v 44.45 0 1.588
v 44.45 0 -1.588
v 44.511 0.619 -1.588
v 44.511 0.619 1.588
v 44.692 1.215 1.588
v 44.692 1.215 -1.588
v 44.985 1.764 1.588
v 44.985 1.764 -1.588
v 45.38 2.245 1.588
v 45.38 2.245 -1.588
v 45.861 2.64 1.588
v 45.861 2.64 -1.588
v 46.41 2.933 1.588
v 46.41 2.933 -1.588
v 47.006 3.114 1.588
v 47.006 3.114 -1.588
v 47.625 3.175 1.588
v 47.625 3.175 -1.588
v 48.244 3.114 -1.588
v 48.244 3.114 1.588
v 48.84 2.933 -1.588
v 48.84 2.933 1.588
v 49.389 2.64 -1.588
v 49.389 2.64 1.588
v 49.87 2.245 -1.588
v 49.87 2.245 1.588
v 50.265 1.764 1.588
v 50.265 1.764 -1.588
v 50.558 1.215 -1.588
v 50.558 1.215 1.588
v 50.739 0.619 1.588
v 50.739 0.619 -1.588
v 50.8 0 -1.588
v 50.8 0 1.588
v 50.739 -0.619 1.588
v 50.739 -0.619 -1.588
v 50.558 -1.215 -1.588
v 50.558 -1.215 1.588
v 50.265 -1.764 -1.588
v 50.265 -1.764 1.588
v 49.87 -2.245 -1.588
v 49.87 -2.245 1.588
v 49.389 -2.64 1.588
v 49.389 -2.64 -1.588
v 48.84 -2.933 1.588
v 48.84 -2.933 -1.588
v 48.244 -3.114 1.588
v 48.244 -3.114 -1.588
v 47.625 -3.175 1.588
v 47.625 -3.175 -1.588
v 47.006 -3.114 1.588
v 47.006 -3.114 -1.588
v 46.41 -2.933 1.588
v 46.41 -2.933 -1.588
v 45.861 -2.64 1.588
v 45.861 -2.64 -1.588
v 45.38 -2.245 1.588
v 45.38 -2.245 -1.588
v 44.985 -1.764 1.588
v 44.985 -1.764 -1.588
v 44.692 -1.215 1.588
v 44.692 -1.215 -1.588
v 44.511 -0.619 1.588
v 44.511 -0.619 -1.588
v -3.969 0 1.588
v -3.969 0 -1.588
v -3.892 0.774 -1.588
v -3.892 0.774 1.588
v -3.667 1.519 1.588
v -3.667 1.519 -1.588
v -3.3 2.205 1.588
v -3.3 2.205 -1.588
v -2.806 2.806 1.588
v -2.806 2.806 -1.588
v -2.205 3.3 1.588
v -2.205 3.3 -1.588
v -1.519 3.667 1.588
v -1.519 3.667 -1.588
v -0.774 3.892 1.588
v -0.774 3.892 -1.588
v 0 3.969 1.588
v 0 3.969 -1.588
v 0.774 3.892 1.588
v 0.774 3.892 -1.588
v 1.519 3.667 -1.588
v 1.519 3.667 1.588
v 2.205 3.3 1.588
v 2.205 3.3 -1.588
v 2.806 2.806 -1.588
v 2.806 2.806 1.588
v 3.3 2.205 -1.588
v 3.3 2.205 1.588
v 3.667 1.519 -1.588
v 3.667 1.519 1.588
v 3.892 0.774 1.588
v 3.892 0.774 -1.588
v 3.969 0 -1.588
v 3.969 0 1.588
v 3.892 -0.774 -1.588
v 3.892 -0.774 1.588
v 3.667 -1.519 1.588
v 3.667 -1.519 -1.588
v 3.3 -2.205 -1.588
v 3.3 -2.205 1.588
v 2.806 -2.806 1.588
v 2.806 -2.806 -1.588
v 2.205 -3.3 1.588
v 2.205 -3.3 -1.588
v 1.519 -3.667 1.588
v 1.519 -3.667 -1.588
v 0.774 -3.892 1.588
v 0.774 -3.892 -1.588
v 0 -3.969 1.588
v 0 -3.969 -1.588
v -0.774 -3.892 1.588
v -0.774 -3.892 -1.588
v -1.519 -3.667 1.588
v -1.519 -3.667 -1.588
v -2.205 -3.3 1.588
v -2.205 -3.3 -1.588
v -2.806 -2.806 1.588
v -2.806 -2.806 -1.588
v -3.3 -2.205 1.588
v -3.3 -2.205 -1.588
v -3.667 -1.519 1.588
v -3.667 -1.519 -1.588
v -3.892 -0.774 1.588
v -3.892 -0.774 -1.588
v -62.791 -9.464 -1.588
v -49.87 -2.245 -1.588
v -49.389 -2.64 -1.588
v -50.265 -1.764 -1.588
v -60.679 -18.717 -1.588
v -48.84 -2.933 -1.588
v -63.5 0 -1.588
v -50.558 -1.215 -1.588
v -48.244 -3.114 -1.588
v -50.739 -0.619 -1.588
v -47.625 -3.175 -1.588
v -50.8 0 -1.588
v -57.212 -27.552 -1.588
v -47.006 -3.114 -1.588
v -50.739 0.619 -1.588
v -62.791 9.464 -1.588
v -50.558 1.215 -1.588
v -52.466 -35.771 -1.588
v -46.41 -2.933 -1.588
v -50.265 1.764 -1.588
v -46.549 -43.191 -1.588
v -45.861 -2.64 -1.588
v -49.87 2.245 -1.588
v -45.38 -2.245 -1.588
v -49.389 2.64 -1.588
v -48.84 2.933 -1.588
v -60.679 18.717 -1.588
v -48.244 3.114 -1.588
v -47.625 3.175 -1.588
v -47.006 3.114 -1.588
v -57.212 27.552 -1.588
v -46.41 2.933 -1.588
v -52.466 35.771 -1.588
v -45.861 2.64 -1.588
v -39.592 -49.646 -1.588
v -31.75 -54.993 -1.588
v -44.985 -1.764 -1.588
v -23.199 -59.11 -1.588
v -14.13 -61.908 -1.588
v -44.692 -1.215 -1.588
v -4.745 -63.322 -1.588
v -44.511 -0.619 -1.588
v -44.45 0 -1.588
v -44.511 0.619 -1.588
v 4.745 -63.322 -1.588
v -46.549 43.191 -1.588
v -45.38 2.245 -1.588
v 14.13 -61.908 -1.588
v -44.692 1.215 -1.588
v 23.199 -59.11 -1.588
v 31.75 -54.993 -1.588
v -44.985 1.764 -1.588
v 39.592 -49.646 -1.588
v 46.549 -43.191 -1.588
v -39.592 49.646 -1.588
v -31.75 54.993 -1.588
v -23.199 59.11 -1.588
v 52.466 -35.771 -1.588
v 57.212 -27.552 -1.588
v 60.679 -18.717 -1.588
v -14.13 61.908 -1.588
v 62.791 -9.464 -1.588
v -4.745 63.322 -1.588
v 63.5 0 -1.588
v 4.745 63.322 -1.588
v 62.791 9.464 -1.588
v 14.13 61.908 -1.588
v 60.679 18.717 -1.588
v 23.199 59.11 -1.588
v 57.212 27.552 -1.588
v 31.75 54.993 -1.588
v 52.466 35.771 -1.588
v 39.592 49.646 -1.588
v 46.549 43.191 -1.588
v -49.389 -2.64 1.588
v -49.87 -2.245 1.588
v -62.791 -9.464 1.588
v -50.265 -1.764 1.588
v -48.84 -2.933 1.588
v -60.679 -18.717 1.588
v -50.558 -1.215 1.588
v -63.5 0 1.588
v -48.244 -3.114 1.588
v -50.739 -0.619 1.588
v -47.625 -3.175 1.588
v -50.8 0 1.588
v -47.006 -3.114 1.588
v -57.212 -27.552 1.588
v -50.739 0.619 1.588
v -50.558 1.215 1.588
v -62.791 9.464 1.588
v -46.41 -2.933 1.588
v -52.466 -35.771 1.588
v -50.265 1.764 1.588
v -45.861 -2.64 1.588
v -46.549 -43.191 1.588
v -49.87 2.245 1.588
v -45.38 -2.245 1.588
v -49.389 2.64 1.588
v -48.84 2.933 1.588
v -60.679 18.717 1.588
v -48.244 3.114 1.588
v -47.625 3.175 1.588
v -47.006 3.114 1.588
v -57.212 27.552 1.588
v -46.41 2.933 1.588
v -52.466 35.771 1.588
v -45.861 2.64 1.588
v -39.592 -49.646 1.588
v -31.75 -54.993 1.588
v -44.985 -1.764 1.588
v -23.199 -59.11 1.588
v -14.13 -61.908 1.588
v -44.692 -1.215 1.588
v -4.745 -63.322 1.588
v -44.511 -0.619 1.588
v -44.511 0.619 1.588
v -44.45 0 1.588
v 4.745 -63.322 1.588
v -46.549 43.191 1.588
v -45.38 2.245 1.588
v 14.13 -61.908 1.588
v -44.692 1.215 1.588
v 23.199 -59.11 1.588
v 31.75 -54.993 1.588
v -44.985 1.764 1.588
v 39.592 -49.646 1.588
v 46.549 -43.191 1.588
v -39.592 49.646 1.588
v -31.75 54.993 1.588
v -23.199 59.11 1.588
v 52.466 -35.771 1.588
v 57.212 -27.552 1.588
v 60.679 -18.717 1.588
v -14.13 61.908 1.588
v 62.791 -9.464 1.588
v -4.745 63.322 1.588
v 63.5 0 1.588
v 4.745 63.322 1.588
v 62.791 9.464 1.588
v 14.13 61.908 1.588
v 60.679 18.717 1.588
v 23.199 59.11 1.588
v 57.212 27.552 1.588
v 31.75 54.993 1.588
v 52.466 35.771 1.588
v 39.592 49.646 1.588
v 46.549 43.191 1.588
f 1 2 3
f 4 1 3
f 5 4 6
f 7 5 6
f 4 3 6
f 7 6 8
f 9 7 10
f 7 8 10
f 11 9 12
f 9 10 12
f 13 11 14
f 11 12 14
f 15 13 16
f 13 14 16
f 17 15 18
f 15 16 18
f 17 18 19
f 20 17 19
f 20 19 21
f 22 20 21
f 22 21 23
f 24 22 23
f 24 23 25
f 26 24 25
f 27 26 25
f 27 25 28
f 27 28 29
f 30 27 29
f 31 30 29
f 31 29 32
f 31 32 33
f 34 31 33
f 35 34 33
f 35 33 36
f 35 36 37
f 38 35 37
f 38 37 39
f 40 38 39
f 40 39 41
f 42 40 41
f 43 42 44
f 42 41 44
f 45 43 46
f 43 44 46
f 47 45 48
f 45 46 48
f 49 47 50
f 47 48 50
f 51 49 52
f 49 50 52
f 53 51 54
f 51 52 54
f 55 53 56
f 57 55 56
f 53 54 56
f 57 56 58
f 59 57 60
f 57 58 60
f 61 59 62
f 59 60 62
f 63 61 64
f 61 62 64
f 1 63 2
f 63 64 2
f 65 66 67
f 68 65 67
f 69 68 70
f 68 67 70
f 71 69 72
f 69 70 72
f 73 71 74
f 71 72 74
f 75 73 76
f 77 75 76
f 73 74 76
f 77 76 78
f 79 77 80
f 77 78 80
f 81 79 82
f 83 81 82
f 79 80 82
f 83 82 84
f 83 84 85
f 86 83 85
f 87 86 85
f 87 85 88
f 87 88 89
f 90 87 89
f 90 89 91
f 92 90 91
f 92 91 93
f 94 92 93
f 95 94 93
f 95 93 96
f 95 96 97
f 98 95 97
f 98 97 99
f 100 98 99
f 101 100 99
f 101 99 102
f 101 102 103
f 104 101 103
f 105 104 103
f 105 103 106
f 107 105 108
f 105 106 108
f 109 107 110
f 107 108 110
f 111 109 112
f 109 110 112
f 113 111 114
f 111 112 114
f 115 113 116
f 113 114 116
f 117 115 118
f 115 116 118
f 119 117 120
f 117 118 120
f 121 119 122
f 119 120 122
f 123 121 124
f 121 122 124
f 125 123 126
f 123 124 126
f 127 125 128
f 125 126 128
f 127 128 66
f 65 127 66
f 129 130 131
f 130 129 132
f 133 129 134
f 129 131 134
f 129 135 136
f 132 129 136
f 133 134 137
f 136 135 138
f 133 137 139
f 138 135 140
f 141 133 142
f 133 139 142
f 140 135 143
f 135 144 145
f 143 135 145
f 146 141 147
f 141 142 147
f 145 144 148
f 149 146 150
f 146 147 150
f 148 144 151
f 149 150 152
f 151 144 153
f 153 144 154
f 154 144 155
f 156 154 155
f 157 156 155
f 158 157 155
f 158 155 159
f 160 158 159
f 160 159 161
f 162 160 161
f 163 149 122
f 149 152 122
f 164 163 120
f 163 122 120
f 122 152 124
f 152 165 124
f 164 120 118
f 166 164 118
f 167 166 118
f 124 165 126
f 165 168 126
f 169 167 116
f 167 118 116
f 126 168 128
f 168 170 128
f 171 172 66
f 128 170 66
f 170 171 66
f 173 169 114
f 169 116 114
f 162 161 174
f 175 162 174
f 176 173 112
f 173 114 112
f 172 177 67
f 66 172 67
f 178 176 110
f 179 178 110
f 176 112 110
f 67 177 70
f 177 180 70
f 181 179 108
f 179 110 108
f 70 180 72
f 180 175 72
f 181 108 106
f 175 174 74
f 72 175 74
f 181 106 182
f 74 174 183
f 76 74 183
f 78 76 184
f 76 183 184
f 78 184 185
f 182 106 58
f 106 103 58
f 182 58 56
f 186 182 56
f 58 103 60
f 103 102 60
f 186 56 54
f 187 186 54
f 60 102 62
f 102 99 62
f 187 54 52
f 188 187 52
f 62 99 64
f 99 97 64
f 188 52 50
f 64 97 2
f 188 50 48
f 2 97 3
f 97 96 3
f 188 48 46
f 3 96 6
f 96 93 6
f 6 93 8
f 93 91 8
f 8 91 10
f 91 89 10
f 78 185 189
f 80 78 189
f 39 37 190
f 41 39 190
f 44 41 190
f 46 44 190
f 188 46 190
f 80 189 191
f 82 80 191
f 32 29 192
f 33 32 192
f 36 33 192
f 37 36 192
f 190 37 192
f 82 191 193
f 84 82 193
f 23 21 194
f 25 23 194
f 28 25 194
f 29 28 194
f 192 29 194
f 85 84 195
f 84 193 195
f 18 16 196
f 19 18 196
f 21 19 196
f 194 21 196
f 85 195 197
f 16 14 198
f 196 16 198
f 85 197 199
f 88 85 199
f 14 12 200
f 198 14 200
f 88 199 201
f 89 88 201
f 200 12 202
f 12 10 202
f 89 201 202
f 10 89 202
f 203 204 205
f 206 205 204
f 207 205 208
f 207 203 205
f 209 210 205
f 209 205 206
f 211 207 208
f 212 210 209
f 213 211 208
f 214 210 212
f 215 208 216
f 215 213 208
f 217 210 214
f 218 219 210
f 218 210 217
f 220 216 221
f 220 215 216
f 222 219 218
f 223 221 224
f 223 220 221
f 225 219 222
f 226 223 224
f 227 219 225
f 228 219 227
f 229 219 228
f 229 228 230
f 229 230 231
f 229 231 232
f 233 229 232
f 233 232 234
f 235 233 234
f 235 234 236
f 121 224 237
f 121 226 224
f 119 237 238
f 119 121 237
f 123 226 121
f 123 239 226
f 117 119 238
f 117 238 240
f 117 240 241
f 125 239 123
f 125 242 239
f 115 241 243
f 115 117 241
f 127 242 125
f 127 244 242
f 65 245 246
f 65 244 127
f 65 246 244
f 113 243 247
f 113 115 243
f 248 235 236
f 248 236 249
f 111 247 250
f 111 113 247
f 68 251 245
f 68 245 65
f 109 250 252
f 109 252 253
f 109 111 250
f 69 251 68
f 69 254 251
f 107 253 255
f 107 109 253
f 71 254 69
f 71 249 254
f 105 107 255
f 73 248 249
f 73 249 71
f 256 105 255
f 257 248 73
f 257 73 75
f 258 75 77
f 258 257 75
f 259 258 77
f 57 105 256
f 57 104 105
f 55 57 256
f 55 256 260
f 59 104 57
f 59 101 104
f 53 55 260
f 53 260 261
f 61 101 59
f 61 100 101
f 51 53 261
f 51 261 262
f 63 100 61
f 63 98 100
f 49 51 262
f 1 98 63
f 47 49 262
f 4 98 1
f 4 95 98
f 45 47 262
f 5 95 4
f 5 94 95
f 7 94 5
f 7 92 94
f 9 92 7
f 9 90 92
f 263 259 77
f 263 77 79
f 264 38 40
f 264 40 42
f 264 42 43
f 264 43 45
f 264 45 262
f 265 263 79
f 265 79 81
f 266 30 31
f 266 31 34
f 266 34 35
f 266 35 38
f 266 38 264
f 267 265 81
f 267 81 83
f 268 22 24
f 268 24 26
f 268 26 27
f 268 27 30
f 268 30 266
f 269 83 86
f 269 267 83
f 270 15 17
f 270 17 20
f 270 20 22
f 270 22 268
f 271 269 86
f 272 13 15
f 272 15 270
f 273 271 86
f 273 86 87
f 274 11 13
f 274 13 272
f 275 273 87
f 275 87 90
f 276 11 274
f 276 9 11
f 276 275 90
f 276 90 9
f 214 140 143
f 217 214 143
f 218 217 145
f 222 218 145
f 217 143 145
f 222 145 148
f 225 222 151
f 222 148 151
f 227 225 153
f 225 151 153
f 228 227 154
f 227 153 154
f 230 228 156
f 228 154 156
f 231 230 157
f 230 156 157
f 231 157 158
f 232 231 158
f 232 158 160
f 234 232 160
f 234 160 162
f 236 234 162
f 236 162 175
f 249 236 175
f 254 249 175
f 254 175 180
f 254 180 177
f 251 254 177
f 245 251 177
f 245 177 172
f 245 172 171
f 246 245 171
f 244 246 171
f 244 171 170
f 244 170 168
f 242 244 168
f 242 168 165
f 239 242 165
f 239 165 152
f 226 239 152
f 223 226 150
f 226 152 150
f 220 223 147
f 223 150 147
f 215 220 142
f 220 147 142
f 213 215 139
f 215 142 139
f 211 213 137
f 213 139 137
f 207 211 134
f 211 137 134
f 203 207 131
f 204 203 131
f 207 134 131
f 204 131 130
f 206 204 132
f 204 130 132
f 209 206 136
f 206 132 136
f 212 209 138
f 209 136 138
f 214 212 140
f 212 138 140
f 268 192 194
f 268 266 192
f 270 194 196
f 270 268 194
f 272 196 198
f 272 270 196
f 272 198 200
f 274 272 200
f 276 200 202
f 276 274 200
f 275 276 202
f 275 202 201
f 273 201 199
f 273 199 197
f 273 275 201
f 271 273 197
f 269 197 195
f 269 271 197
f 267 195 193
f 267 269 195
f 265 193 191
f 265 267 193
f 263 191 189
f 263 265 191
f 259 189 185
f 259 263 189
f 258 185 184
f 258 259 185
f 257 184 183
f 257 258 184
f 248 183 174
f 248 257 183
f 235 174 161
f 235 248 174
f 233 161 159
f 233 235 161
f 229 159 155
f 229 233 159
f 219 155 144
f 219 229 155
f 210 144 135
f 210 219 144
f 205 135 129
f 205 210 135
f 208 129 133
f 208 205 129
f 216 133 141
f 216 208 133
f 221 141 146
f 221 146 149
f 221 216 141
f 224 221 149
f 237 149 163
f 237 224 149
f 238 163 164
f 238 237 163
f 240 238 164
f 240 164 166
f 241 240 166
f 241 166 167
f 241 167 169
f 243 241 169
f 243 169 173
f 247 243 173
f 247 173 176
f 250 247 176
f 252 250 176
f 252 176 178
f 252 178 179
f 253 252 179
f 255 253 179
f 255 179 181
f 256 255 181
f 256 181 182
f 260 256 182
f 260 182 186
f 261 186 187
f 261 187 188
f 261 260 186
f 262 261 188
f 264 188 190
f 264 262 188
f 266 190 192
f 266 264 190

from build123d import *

# Parameters (mm, degrees)
SKETCH1_R                          = 63.5
BOSS_EXTRUDE1_DEPTH                = 1.5875
F_1_4_0_25_DIAMETER_HOLE1_D        = 6.35
F_5_16_0_3125_DIAMETER_HOLE1_D     = 7.9375
F_5_16_0_3125_DIAMETER_HOLE1_DEPTH = 3.302


with BuildPart() as part:
    # Sketch1 → Boss-Extrude1 (new body, symmetric)
    with BuildSketch(Plane.XY):
        Circle(SKETCH1_R)
    extrude(amount=BOSS_EXTRUDE1_DEPTH, both=True)

    # 1/4 (0.25) Diameter Hole1 (through all)
    with Locations(Plane.XY.offset(1.5875)):
        with Locations((-47.625, 0), (47.625, 0)):
            Hole(F_1_4_0_25_DIAMETER_HOLE1_D / 2)

    # 5/16 (0.3125) Diameter Hole1
    with Locations(Plane.XY.offset(1.5875)):
        with Locations((0, 0)):
            Hole(F_5_16_0_3125_DIAMETER_HOLE1_D / 2, depth=F_5_16_0_3125_DIAMETER_HOLE1_DEPTH)


solid = part.part
